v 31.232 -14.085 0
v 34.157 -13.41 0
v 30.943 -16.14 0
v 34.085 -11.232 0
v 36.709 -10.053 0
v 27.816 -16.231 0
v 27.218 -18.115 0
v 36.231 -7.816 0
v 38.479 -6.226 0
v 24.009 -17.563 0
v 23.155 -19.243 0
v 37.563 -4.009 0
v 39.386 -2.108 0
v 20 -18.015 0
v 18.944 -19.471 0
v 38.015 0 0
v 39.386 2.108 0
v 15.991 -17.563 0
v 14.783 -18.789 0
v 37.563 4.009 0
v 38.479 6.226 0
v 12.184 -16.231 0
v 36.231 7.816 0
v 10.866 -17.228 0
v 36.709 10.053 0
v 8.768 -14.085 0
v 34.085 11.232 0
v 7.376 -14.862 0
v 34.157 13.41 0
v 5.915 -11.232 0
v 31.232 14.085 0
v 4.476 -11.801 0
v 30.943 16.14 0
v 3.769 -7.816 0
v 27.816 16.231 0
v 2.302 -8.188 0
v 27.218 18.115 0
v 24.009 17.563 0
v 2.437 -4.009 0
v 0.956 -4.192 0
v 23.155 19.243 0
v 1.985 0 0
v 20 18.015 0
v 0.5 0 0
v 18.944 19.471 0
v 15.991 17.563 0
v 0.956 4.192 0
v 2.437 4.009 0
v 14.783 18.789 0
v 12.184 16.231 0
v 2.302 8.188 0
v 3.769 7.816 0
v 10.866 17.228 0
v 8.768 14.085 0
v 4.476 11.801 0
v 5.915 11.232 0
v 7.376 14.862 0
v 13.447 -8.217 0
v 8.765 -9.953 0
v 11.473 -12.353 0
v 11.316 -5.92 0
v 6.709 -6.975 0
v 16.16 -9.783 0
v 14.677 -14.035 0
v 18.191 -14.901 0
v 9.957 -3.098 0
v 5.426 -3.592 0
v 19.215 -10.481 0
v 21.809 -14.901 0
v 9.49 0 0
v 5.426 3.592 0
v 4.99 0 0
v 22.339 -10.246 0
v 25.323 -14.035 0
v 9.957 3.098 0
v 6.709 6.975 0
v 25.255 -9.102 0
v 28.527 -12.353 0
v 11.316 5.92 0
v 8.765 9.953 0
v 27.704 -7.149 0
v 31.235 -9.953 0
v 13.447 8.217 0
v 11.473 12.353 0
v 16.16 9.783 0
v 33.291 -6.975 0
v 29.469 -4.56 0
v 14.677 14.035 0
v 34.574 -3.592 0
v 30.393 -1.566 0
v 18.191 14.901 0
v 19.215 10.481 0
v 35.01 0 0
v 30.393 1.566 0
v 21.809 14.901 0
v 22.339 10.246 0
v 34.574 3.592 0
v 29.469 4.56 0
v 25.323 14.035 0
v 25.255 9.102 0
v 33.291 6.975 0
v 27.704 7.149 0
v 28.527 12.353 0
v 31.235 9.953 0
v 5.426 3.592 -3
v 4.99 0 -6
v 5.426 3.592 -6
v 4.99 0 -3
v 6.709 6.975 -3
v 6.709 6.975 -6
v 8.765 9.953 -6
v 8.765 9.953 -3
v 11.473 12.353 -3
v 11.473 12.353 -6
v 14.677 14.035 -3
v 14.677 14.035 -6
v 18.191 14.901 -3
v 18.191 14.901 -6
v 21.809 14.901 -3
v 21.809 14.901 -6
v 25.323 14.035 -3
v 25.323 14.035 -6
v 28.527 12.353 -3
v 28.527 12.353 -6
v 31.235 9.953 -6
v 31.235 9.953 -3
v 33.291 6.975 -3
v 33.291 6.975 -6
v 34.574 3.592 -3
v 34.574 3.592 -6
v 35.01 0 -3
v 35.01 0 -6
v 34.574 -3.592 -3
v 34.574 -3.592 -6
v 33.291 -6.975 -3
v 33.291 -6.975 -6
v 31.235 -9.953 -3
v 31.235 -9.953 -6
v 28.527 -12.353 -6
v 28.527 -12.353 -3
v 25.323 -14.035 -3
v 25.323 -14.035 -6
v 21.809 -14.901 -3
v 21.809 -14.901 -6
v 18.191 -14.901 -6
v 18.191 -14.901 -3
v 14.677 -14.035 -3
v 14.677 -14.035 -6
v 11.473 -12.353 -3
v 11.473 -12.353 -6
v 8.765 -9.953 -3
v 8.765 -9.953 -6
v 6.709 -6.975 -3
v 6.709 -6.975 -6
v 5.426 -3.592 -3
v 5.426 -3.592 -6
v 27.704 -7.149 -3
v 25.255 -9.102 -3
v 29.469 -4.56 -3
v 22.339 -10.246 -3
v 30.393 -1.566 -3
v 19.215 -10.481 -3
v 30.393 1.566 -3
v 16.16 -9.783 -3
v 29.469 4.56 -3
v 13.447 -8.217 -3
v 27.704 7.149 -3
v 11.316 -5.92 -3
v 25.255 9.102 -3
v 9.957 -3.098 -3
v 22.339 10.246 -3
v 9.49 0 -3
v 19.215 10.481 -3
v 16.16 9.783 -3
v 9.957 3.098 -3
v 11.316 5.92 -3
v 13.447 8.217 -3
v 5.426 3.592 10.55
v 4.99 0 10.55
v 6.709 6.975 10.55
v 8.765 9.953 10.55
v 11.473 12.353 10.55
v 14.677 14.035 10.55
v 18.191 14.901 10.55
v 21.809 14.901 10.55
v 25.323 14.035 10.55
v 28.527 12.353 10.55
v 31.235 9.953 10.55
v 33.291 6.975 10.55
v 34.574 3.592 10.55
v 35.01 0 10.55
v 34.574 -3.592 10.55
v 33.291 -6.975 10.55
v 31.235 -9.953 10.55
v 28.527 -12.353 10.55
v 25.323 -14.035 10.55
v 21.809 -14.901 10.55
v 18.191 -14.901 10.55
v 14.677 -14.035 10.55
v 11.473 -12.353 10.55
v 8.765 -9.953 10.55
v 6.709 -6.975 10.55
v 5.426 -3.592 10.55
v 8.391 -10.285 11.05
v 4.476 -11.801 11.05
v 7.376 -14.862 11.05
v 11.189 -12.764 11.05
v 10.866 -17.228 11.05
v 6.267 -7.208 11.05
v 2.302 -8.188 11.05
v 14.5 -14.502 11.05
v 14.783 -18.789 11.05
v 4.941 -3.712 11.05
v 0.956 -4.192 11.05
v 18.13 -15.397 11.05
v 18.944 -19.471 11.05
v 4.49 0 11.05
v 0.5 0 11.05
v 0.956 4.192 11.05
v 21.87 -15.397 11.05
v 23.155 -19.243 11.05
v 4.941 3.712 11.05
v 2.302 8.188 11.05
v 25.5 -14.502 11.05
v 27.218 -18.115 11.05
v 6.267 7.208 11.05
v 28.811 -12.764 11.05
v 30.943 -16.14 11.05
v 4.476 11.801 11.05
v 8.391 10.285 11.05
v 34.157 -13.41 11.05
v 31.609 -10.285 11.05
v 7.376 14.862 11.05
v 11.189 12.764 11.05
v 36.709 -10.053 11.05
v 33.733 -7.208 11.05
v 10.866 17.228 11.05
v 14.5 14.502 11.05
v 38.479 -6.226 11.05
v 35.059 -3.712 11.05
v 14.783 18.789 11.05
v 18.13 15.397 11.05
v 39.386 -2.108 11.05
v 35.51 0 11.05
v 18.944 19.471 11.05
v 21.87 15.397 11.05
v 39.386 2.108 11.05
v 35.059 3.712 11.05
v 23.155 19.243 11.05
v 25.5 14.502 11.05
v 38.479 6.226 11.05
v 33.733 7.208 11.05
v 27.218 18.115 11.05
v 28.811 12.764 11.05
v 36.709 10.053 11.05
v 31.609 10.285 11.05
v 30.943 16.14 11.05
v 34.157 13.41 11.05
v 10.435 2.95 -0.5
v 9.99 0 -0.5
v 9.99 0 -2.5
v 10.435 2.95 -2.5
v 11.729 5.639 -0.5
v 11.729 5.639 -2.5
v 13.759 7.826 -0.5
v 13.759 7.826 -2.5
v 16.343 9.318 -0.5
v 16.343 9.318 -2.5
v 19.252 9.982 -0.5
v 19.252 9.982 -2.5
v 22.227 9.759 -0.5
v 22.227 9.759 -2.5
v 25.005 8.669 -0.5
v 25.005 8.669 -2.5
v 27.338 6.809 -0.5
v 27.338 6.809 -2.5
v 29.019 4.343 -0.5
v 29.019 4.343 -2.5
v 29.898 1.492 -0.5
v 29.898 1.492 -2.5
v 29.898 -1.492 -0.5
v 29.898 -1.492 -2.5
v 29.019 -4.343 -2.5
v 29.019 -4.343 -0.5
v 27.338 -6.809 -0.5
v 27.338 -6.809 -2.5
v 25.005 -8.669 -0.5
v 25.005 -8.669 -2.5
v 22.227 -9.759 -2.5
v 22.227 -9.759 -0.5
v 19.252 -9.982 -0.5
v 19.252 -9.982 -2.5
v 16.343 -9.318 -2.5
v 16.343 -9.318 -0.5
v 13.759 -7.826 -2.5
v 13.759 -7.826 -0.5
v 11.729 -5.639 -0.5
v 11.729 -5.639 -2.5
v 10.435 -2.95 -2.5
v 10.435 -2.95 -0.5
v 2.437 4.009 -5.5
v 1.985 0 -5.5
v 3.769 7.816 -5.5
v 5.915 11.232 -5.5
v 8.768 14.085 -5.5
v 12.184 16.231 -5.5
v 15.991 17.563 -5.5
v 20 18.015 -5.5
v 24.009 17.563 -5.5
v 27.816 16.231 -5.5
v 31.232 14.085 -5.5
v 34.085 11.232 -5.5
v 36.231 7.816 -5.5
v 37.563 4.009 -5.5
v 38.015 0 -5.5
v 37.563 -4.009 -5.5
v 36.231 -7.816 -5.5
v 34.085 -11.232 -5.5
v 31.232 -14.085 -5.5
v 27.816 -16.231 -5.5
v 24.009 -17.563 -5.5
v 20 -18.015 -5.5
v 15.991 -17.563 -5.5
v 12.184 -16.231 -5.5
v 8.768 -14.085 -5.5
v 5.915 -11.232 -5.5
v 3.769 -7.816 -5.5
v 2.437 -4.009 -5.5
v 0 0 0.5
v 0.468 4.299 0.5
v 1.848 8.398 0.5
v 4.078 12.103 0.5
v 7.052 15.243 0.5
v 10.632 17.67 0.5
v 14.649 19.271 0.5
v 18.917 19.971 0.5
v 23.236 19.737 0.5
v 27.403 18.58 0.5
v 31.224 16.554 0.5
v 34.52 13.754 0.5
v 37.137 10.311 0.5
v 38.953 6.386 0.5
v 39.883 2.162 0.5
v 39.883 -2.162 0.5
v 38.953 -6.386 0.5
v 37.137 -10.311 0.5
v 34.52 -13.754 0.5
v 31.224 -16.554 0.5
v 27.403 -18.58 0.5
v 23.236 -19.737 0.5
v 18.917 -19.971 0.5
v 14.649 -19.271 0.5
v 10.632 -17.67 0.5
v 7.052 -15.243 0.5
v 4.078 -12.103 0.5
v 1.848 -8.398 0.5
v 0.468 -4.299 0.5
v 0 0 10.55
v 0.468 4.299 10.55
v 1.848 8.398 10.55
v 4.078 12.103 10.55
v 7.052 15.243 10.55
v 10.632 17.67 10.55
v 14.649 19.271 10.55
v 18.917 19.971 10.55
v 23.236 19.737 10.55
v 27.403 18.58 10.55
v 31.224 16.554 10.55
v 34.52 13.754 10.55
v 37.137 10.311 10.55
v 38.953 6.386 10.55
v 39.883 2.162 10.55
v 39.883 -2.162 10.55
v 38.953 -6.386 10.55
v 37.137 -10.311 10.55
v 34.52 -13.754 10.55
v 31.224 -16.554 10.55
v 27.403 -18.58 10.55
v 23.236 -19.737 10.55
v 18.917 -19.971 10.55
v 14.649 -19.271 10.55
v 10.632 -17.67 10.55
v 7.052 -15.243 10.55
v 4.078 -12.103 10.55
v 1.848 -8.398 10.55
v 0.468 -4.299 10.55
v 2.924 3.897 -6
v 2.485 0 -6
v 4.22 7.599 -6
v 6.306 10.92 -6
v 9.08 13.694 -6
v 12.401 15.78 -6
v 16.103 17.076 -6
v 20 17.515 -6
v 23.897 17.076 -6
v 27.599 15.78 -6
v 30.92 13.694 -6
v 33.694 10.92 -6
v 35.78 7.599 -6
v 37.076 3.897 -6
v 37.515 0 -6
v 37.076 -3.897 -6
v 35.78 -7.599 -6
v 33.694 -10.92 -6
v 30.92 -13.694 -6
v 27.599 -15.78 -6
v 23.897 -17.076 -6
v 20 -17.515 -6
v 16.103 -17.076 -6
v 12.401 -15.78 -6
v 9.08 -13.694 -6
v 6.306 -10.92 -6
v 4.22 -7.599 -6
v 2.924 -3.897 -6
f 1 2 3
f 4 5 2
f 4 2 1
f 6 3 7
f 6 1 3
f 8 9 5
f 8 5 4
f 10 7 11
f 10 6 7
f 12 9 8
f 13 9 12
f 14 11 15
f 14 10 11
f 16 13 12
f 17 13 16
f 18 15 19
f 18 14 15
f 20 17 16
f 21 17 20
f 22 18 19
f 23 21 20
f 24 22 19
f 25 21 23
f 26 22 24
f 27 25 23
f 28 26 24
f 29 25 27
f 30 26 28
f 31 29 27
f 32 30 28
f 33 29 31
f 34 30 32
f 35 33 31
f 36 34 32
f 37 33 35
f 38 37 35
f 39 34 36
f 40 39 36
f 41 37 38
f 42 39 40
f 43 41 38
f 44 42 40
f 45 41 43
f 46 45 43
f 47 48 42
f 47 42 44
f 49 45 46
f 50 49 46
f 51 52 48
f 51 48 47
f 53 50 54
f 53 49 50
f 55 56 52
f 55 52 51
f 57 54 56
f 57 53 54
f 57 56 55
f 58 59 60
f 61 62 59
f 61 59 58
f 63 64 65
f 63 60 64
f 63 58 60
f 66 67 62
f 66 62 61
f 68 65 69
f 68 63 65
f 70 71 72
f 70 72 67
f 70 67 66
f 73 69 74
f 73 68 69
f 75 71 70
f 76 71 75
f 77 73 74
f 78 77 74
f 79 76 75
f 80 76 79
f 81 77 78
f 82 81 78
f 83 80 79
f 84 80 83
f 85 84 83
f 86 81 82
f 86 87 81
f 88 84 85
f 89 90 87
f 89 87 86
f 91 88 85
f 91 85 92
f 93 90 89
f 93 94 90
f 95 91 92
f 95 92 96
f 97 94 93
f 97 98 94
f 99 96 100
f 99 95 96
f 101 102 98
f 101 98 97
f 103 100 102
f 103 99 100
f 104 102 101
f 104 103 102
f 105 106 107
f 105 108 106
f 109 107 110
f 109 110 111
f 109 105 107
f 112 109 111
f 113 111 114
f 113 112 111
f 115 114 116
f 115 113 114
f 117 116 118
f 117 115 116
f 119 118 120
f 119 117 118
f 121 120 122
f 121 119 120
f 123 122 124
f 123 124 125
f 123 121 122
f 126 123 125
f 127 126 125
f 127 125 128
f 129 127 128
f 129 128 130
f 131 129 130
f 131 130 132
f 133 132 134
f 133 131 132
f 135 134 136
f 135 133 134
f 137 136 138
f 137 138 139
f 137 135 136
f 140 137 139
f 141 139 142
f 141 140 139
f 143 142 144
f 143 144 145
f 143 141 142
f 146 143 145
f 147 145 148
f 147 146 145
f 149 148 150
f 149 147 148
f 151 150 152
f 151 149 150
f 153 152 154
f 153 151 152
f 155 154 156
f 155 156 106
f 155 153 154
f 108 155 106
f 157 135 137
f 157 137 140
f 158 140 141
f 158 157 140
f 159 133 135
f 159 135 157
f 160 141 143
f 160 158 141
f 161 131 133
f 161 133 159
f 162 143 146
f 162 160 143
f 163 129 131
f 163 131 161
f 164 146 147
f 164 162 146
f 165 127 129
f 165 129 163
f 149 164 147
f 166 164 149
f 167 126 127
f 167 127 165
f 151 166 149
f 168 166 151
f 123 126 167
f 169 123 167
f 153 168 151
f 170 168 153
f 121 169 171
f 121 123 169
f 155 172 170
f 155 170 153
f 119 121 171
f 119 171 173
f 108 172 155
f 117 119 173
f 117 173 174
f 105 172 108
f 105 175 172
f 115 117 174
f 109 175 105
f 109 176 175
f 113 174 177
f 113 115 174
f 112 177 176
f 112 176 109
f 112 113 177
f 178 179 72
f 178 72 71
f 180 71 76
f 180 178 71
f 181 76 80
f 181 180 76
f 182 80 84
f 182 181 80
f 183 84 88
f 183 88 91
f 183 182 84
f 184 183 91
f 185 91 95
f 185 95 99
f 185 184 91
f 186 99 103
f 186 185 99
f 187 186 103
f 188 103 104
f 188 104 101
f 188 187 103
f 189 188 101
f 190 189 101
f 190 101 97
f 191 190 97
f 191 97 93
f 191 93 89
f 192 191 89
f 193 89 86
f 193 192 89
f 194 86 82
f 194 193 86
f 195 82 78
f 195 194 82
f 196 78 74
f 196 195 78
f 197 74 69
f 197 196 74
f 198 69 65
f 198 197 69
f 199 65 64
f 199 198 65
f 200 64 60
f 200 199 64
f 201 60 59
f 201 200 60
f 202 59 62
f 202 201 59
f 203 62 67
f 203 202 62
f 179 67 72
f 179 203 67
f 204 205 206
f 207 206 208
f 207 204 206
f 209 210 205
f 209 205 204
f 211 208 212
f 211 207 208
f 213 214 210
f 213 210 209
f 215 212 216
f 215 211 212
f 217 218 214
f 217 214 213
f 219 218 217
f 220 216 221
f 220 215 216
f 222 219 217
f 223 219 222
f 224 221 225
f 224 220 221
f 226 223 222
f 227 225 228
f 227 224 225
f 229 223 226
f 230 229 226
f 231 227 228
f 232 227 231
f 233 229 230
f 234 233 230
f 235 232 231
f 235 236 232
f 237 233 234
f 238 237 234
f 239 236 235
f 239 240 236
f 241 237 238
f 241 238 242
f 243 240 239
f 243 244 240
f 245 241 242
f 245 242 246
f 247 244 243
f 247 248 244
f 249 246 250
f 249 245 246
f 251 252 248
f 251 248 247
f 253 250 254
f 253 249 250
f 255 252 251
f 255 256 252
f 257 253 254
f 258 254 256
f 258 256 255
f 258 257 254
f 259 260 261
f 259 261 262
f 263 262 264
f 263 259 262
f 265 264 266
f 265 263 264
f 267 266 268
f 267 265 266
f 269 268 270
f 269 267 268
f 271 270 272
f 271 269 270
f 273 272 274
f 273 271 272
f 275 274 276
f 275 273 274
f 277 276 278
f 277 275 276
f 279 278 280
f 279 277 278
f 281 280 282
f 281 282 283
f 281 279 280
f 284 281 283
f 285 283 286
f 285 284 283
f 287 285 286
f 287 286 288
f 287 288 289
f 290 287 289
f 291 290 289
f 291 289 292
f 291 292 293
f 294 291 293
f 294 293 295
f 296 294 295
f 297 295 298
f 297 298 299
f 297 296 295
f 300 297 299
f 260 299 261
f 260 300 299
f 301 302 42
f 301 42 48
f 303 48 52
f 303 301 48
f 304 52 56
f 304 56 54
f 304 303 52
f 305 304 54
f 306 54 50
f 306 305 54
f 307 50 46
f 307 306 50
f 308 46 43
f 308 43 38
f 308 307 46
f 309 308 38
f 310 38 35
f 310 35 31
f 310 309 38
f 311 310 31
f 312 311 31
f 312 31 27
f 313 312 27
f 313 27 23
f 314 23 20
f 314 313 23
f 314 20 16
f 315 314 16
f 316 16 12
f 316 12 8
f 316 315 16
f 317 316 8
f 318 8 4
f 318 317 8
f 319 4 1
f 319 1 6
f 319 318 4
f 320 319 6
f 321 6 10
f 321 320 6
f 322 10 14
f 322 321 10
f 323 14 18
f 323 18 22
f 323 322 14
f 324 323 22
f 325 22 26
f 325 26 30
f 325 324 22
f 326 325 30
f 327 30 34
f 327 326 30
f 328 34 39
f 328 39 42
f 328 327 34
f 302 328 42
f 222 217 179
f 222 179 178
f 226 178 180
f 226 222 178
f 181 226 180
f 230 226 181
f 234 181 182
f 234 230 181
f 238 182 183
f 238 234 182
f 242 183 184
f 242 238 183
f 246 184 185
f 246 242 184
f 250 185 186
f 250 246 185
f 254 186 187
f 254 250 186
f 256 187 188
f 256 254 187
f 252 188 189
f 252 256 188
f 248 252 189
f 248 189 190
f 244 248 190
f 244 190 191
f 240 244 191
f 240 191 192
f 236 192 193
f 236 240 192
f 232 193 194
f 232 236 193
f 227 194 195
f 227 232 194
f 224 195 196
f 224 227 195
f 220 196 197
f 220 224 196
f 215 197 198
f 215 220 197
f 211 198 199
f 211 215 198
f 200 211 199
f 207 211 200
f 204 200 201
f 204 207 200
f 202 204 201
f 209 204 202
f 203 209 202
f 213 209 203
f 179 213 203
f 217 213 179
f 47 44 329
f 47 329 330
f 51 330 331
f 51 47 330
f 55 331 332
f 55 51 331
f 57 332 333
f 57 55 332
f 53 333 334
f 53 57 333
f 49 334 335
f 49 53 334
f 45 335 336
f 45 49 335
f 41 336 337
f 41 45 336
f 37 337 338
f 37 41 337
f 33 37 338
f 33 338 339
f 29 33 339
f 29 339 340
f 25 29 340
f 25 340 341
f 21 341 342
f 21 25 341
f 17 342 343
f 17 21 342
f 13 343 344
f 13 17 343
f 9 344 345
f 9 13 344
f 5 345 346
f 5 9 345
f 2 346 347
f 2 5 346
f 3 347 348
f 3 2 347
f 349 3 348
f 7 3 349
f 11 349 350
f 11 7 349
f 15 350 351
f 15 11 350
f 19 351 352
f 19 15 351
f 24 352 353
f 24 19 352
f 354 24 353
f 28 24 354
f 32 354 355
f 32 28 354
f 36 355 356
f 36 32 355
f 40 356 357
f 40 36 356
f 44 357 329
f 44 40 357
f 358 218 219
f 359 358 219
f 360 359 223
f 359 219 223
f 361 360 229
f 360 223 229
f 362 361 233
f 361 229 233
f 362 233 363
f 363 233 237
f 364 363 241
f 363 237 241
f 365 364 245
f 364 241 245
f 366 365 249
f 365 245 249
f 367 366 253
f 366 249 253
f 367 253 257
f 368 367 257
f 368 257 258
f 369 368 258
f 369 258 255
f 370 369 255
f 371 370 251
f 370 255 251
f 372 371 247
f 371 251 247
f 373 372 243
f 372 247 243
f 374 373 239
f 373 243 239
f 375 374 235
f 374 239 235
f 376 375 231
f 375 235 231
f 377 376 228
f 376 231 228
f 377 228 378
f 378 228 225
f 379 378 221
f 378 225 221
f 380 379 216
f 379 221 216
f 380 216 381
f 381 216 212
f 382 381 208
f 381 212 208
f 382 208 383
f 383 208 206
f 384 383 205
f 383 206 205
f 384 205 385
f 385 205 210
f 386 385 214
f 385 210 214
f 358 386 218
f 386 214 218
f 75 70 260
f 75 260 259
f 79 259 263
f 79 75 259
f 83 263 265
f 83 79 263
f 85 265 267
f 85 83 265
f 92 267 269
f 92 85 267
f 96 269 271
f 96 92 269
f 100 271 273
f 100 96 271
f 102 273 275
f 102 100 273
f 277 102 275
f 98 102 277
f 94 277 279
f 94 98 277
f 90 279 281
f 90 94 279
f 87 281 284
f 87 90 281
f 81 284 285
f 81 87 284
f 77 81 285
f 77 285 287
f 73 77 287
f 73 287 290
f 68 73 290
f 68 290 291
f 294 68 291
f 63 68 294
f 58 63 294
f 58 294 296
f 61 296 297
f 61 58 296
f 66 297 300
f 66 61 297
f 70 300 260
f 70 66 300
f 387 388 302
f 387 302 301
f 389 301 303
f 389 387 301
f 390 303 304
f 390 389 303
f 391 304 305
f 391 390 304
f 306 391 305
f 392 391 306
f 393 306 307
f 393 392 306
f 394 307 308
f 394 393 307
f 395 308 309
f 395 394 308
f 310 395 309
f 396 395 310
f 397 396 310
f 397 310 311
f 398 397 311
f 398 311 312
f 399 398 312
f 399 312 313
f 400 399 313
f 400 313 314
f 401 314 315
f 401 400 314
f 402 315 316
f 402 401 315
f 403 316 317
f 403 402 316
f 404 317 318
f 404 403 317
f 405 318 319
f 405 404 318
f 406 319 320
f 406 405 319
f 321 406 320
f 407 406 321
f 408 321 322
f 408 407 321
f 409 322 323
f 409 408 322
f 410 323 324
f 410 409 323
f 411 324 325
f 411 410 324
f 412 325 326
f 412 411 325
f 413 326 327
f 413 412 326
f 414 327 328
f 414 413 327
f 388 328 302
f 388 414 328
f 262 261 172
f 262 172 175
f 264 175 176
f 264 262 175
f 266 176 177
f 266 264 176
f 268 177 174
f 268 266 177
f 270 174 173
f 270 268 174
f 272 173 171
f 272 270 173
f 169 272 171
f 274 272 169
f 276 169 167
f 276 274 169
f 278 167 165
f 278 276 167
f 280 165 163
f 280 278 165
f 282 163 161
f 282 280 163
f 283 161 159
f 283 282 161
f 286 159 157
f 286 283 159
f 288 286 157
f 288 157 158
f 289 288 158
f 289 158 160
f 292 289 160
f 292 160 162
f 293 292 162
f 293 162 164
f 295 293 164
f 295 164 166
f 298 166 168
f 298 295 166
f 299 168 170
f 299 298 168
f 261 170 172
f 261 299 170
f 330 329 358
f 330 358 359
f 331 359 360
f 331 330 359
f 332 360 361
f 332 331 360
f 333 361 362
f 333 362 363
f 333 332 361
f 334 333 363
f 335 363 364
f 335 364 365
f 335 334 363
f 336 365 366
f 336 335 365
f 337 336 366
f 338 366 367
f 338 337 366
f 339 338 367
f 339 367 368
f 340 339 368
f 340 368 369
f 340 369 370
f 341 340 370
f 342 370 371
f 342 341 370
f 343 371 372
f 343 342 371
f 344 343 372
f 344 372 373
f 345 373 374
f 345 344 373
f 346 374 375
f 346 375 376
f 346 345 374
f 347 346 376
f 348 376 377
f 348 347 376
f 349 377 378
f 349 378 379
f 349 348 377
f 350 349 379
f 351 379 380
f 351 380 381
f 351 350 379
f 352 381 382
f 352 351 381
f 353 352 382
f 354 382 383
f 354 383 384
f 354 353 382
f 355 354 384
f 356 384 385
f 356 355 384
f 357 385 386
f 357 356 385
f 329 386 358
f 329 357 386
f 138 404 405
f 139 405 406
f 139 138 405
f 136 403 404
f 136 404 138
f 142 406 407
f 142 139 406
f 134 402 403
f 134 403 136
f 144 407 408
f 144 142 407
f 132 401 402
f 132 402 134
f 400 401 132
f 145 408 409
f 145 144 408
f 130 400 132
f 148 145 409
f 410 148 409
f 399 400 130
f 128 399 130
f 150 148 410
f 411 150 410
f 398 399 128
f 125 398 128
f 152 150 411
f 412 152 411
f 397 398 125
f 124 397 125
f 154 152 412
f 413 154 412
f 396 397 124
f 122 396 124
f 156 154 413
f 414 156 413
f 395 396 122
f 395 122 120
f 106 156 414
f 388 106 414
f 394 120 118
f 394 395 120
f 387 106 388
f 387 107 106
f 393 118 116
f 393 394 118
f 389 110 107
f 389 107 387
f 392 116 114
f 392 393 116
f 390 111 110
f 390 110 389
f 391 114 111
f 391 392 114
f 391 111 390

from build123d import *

# Parameters (mm, degrees)
F2_SIZE = 0.5


with BuildPart() as f1:
    # F0 (on Front) → F1 (revolve)
    with BuildSketch(Plane.XZ):
        Polygon((0, 11.05), (0, 0), (1.985, 0), (1.985, -6), (4.99, -6), (4.99, -3), (9.99, -3), (9.99, 0), (4.99, 0), (4.99, 11.05), align=None)
    revolve(axis=Axis((20, 0, 0.0311555341), (0, 0, -1)))

    # F2
    f2_edges = [f1.edges().sort_by_distance(p)[0] for p in [
        (35.01, 0, 11.05),
        (40, 0, 11.05),
        (40, 0, 0),
        (38.015, 0, -6),
        (30.01, 0, -3),
        (30.01, 0, 0),
    ]]
    chamfer(f2_edges, length=F2_SIZE)


solid = f1.part
